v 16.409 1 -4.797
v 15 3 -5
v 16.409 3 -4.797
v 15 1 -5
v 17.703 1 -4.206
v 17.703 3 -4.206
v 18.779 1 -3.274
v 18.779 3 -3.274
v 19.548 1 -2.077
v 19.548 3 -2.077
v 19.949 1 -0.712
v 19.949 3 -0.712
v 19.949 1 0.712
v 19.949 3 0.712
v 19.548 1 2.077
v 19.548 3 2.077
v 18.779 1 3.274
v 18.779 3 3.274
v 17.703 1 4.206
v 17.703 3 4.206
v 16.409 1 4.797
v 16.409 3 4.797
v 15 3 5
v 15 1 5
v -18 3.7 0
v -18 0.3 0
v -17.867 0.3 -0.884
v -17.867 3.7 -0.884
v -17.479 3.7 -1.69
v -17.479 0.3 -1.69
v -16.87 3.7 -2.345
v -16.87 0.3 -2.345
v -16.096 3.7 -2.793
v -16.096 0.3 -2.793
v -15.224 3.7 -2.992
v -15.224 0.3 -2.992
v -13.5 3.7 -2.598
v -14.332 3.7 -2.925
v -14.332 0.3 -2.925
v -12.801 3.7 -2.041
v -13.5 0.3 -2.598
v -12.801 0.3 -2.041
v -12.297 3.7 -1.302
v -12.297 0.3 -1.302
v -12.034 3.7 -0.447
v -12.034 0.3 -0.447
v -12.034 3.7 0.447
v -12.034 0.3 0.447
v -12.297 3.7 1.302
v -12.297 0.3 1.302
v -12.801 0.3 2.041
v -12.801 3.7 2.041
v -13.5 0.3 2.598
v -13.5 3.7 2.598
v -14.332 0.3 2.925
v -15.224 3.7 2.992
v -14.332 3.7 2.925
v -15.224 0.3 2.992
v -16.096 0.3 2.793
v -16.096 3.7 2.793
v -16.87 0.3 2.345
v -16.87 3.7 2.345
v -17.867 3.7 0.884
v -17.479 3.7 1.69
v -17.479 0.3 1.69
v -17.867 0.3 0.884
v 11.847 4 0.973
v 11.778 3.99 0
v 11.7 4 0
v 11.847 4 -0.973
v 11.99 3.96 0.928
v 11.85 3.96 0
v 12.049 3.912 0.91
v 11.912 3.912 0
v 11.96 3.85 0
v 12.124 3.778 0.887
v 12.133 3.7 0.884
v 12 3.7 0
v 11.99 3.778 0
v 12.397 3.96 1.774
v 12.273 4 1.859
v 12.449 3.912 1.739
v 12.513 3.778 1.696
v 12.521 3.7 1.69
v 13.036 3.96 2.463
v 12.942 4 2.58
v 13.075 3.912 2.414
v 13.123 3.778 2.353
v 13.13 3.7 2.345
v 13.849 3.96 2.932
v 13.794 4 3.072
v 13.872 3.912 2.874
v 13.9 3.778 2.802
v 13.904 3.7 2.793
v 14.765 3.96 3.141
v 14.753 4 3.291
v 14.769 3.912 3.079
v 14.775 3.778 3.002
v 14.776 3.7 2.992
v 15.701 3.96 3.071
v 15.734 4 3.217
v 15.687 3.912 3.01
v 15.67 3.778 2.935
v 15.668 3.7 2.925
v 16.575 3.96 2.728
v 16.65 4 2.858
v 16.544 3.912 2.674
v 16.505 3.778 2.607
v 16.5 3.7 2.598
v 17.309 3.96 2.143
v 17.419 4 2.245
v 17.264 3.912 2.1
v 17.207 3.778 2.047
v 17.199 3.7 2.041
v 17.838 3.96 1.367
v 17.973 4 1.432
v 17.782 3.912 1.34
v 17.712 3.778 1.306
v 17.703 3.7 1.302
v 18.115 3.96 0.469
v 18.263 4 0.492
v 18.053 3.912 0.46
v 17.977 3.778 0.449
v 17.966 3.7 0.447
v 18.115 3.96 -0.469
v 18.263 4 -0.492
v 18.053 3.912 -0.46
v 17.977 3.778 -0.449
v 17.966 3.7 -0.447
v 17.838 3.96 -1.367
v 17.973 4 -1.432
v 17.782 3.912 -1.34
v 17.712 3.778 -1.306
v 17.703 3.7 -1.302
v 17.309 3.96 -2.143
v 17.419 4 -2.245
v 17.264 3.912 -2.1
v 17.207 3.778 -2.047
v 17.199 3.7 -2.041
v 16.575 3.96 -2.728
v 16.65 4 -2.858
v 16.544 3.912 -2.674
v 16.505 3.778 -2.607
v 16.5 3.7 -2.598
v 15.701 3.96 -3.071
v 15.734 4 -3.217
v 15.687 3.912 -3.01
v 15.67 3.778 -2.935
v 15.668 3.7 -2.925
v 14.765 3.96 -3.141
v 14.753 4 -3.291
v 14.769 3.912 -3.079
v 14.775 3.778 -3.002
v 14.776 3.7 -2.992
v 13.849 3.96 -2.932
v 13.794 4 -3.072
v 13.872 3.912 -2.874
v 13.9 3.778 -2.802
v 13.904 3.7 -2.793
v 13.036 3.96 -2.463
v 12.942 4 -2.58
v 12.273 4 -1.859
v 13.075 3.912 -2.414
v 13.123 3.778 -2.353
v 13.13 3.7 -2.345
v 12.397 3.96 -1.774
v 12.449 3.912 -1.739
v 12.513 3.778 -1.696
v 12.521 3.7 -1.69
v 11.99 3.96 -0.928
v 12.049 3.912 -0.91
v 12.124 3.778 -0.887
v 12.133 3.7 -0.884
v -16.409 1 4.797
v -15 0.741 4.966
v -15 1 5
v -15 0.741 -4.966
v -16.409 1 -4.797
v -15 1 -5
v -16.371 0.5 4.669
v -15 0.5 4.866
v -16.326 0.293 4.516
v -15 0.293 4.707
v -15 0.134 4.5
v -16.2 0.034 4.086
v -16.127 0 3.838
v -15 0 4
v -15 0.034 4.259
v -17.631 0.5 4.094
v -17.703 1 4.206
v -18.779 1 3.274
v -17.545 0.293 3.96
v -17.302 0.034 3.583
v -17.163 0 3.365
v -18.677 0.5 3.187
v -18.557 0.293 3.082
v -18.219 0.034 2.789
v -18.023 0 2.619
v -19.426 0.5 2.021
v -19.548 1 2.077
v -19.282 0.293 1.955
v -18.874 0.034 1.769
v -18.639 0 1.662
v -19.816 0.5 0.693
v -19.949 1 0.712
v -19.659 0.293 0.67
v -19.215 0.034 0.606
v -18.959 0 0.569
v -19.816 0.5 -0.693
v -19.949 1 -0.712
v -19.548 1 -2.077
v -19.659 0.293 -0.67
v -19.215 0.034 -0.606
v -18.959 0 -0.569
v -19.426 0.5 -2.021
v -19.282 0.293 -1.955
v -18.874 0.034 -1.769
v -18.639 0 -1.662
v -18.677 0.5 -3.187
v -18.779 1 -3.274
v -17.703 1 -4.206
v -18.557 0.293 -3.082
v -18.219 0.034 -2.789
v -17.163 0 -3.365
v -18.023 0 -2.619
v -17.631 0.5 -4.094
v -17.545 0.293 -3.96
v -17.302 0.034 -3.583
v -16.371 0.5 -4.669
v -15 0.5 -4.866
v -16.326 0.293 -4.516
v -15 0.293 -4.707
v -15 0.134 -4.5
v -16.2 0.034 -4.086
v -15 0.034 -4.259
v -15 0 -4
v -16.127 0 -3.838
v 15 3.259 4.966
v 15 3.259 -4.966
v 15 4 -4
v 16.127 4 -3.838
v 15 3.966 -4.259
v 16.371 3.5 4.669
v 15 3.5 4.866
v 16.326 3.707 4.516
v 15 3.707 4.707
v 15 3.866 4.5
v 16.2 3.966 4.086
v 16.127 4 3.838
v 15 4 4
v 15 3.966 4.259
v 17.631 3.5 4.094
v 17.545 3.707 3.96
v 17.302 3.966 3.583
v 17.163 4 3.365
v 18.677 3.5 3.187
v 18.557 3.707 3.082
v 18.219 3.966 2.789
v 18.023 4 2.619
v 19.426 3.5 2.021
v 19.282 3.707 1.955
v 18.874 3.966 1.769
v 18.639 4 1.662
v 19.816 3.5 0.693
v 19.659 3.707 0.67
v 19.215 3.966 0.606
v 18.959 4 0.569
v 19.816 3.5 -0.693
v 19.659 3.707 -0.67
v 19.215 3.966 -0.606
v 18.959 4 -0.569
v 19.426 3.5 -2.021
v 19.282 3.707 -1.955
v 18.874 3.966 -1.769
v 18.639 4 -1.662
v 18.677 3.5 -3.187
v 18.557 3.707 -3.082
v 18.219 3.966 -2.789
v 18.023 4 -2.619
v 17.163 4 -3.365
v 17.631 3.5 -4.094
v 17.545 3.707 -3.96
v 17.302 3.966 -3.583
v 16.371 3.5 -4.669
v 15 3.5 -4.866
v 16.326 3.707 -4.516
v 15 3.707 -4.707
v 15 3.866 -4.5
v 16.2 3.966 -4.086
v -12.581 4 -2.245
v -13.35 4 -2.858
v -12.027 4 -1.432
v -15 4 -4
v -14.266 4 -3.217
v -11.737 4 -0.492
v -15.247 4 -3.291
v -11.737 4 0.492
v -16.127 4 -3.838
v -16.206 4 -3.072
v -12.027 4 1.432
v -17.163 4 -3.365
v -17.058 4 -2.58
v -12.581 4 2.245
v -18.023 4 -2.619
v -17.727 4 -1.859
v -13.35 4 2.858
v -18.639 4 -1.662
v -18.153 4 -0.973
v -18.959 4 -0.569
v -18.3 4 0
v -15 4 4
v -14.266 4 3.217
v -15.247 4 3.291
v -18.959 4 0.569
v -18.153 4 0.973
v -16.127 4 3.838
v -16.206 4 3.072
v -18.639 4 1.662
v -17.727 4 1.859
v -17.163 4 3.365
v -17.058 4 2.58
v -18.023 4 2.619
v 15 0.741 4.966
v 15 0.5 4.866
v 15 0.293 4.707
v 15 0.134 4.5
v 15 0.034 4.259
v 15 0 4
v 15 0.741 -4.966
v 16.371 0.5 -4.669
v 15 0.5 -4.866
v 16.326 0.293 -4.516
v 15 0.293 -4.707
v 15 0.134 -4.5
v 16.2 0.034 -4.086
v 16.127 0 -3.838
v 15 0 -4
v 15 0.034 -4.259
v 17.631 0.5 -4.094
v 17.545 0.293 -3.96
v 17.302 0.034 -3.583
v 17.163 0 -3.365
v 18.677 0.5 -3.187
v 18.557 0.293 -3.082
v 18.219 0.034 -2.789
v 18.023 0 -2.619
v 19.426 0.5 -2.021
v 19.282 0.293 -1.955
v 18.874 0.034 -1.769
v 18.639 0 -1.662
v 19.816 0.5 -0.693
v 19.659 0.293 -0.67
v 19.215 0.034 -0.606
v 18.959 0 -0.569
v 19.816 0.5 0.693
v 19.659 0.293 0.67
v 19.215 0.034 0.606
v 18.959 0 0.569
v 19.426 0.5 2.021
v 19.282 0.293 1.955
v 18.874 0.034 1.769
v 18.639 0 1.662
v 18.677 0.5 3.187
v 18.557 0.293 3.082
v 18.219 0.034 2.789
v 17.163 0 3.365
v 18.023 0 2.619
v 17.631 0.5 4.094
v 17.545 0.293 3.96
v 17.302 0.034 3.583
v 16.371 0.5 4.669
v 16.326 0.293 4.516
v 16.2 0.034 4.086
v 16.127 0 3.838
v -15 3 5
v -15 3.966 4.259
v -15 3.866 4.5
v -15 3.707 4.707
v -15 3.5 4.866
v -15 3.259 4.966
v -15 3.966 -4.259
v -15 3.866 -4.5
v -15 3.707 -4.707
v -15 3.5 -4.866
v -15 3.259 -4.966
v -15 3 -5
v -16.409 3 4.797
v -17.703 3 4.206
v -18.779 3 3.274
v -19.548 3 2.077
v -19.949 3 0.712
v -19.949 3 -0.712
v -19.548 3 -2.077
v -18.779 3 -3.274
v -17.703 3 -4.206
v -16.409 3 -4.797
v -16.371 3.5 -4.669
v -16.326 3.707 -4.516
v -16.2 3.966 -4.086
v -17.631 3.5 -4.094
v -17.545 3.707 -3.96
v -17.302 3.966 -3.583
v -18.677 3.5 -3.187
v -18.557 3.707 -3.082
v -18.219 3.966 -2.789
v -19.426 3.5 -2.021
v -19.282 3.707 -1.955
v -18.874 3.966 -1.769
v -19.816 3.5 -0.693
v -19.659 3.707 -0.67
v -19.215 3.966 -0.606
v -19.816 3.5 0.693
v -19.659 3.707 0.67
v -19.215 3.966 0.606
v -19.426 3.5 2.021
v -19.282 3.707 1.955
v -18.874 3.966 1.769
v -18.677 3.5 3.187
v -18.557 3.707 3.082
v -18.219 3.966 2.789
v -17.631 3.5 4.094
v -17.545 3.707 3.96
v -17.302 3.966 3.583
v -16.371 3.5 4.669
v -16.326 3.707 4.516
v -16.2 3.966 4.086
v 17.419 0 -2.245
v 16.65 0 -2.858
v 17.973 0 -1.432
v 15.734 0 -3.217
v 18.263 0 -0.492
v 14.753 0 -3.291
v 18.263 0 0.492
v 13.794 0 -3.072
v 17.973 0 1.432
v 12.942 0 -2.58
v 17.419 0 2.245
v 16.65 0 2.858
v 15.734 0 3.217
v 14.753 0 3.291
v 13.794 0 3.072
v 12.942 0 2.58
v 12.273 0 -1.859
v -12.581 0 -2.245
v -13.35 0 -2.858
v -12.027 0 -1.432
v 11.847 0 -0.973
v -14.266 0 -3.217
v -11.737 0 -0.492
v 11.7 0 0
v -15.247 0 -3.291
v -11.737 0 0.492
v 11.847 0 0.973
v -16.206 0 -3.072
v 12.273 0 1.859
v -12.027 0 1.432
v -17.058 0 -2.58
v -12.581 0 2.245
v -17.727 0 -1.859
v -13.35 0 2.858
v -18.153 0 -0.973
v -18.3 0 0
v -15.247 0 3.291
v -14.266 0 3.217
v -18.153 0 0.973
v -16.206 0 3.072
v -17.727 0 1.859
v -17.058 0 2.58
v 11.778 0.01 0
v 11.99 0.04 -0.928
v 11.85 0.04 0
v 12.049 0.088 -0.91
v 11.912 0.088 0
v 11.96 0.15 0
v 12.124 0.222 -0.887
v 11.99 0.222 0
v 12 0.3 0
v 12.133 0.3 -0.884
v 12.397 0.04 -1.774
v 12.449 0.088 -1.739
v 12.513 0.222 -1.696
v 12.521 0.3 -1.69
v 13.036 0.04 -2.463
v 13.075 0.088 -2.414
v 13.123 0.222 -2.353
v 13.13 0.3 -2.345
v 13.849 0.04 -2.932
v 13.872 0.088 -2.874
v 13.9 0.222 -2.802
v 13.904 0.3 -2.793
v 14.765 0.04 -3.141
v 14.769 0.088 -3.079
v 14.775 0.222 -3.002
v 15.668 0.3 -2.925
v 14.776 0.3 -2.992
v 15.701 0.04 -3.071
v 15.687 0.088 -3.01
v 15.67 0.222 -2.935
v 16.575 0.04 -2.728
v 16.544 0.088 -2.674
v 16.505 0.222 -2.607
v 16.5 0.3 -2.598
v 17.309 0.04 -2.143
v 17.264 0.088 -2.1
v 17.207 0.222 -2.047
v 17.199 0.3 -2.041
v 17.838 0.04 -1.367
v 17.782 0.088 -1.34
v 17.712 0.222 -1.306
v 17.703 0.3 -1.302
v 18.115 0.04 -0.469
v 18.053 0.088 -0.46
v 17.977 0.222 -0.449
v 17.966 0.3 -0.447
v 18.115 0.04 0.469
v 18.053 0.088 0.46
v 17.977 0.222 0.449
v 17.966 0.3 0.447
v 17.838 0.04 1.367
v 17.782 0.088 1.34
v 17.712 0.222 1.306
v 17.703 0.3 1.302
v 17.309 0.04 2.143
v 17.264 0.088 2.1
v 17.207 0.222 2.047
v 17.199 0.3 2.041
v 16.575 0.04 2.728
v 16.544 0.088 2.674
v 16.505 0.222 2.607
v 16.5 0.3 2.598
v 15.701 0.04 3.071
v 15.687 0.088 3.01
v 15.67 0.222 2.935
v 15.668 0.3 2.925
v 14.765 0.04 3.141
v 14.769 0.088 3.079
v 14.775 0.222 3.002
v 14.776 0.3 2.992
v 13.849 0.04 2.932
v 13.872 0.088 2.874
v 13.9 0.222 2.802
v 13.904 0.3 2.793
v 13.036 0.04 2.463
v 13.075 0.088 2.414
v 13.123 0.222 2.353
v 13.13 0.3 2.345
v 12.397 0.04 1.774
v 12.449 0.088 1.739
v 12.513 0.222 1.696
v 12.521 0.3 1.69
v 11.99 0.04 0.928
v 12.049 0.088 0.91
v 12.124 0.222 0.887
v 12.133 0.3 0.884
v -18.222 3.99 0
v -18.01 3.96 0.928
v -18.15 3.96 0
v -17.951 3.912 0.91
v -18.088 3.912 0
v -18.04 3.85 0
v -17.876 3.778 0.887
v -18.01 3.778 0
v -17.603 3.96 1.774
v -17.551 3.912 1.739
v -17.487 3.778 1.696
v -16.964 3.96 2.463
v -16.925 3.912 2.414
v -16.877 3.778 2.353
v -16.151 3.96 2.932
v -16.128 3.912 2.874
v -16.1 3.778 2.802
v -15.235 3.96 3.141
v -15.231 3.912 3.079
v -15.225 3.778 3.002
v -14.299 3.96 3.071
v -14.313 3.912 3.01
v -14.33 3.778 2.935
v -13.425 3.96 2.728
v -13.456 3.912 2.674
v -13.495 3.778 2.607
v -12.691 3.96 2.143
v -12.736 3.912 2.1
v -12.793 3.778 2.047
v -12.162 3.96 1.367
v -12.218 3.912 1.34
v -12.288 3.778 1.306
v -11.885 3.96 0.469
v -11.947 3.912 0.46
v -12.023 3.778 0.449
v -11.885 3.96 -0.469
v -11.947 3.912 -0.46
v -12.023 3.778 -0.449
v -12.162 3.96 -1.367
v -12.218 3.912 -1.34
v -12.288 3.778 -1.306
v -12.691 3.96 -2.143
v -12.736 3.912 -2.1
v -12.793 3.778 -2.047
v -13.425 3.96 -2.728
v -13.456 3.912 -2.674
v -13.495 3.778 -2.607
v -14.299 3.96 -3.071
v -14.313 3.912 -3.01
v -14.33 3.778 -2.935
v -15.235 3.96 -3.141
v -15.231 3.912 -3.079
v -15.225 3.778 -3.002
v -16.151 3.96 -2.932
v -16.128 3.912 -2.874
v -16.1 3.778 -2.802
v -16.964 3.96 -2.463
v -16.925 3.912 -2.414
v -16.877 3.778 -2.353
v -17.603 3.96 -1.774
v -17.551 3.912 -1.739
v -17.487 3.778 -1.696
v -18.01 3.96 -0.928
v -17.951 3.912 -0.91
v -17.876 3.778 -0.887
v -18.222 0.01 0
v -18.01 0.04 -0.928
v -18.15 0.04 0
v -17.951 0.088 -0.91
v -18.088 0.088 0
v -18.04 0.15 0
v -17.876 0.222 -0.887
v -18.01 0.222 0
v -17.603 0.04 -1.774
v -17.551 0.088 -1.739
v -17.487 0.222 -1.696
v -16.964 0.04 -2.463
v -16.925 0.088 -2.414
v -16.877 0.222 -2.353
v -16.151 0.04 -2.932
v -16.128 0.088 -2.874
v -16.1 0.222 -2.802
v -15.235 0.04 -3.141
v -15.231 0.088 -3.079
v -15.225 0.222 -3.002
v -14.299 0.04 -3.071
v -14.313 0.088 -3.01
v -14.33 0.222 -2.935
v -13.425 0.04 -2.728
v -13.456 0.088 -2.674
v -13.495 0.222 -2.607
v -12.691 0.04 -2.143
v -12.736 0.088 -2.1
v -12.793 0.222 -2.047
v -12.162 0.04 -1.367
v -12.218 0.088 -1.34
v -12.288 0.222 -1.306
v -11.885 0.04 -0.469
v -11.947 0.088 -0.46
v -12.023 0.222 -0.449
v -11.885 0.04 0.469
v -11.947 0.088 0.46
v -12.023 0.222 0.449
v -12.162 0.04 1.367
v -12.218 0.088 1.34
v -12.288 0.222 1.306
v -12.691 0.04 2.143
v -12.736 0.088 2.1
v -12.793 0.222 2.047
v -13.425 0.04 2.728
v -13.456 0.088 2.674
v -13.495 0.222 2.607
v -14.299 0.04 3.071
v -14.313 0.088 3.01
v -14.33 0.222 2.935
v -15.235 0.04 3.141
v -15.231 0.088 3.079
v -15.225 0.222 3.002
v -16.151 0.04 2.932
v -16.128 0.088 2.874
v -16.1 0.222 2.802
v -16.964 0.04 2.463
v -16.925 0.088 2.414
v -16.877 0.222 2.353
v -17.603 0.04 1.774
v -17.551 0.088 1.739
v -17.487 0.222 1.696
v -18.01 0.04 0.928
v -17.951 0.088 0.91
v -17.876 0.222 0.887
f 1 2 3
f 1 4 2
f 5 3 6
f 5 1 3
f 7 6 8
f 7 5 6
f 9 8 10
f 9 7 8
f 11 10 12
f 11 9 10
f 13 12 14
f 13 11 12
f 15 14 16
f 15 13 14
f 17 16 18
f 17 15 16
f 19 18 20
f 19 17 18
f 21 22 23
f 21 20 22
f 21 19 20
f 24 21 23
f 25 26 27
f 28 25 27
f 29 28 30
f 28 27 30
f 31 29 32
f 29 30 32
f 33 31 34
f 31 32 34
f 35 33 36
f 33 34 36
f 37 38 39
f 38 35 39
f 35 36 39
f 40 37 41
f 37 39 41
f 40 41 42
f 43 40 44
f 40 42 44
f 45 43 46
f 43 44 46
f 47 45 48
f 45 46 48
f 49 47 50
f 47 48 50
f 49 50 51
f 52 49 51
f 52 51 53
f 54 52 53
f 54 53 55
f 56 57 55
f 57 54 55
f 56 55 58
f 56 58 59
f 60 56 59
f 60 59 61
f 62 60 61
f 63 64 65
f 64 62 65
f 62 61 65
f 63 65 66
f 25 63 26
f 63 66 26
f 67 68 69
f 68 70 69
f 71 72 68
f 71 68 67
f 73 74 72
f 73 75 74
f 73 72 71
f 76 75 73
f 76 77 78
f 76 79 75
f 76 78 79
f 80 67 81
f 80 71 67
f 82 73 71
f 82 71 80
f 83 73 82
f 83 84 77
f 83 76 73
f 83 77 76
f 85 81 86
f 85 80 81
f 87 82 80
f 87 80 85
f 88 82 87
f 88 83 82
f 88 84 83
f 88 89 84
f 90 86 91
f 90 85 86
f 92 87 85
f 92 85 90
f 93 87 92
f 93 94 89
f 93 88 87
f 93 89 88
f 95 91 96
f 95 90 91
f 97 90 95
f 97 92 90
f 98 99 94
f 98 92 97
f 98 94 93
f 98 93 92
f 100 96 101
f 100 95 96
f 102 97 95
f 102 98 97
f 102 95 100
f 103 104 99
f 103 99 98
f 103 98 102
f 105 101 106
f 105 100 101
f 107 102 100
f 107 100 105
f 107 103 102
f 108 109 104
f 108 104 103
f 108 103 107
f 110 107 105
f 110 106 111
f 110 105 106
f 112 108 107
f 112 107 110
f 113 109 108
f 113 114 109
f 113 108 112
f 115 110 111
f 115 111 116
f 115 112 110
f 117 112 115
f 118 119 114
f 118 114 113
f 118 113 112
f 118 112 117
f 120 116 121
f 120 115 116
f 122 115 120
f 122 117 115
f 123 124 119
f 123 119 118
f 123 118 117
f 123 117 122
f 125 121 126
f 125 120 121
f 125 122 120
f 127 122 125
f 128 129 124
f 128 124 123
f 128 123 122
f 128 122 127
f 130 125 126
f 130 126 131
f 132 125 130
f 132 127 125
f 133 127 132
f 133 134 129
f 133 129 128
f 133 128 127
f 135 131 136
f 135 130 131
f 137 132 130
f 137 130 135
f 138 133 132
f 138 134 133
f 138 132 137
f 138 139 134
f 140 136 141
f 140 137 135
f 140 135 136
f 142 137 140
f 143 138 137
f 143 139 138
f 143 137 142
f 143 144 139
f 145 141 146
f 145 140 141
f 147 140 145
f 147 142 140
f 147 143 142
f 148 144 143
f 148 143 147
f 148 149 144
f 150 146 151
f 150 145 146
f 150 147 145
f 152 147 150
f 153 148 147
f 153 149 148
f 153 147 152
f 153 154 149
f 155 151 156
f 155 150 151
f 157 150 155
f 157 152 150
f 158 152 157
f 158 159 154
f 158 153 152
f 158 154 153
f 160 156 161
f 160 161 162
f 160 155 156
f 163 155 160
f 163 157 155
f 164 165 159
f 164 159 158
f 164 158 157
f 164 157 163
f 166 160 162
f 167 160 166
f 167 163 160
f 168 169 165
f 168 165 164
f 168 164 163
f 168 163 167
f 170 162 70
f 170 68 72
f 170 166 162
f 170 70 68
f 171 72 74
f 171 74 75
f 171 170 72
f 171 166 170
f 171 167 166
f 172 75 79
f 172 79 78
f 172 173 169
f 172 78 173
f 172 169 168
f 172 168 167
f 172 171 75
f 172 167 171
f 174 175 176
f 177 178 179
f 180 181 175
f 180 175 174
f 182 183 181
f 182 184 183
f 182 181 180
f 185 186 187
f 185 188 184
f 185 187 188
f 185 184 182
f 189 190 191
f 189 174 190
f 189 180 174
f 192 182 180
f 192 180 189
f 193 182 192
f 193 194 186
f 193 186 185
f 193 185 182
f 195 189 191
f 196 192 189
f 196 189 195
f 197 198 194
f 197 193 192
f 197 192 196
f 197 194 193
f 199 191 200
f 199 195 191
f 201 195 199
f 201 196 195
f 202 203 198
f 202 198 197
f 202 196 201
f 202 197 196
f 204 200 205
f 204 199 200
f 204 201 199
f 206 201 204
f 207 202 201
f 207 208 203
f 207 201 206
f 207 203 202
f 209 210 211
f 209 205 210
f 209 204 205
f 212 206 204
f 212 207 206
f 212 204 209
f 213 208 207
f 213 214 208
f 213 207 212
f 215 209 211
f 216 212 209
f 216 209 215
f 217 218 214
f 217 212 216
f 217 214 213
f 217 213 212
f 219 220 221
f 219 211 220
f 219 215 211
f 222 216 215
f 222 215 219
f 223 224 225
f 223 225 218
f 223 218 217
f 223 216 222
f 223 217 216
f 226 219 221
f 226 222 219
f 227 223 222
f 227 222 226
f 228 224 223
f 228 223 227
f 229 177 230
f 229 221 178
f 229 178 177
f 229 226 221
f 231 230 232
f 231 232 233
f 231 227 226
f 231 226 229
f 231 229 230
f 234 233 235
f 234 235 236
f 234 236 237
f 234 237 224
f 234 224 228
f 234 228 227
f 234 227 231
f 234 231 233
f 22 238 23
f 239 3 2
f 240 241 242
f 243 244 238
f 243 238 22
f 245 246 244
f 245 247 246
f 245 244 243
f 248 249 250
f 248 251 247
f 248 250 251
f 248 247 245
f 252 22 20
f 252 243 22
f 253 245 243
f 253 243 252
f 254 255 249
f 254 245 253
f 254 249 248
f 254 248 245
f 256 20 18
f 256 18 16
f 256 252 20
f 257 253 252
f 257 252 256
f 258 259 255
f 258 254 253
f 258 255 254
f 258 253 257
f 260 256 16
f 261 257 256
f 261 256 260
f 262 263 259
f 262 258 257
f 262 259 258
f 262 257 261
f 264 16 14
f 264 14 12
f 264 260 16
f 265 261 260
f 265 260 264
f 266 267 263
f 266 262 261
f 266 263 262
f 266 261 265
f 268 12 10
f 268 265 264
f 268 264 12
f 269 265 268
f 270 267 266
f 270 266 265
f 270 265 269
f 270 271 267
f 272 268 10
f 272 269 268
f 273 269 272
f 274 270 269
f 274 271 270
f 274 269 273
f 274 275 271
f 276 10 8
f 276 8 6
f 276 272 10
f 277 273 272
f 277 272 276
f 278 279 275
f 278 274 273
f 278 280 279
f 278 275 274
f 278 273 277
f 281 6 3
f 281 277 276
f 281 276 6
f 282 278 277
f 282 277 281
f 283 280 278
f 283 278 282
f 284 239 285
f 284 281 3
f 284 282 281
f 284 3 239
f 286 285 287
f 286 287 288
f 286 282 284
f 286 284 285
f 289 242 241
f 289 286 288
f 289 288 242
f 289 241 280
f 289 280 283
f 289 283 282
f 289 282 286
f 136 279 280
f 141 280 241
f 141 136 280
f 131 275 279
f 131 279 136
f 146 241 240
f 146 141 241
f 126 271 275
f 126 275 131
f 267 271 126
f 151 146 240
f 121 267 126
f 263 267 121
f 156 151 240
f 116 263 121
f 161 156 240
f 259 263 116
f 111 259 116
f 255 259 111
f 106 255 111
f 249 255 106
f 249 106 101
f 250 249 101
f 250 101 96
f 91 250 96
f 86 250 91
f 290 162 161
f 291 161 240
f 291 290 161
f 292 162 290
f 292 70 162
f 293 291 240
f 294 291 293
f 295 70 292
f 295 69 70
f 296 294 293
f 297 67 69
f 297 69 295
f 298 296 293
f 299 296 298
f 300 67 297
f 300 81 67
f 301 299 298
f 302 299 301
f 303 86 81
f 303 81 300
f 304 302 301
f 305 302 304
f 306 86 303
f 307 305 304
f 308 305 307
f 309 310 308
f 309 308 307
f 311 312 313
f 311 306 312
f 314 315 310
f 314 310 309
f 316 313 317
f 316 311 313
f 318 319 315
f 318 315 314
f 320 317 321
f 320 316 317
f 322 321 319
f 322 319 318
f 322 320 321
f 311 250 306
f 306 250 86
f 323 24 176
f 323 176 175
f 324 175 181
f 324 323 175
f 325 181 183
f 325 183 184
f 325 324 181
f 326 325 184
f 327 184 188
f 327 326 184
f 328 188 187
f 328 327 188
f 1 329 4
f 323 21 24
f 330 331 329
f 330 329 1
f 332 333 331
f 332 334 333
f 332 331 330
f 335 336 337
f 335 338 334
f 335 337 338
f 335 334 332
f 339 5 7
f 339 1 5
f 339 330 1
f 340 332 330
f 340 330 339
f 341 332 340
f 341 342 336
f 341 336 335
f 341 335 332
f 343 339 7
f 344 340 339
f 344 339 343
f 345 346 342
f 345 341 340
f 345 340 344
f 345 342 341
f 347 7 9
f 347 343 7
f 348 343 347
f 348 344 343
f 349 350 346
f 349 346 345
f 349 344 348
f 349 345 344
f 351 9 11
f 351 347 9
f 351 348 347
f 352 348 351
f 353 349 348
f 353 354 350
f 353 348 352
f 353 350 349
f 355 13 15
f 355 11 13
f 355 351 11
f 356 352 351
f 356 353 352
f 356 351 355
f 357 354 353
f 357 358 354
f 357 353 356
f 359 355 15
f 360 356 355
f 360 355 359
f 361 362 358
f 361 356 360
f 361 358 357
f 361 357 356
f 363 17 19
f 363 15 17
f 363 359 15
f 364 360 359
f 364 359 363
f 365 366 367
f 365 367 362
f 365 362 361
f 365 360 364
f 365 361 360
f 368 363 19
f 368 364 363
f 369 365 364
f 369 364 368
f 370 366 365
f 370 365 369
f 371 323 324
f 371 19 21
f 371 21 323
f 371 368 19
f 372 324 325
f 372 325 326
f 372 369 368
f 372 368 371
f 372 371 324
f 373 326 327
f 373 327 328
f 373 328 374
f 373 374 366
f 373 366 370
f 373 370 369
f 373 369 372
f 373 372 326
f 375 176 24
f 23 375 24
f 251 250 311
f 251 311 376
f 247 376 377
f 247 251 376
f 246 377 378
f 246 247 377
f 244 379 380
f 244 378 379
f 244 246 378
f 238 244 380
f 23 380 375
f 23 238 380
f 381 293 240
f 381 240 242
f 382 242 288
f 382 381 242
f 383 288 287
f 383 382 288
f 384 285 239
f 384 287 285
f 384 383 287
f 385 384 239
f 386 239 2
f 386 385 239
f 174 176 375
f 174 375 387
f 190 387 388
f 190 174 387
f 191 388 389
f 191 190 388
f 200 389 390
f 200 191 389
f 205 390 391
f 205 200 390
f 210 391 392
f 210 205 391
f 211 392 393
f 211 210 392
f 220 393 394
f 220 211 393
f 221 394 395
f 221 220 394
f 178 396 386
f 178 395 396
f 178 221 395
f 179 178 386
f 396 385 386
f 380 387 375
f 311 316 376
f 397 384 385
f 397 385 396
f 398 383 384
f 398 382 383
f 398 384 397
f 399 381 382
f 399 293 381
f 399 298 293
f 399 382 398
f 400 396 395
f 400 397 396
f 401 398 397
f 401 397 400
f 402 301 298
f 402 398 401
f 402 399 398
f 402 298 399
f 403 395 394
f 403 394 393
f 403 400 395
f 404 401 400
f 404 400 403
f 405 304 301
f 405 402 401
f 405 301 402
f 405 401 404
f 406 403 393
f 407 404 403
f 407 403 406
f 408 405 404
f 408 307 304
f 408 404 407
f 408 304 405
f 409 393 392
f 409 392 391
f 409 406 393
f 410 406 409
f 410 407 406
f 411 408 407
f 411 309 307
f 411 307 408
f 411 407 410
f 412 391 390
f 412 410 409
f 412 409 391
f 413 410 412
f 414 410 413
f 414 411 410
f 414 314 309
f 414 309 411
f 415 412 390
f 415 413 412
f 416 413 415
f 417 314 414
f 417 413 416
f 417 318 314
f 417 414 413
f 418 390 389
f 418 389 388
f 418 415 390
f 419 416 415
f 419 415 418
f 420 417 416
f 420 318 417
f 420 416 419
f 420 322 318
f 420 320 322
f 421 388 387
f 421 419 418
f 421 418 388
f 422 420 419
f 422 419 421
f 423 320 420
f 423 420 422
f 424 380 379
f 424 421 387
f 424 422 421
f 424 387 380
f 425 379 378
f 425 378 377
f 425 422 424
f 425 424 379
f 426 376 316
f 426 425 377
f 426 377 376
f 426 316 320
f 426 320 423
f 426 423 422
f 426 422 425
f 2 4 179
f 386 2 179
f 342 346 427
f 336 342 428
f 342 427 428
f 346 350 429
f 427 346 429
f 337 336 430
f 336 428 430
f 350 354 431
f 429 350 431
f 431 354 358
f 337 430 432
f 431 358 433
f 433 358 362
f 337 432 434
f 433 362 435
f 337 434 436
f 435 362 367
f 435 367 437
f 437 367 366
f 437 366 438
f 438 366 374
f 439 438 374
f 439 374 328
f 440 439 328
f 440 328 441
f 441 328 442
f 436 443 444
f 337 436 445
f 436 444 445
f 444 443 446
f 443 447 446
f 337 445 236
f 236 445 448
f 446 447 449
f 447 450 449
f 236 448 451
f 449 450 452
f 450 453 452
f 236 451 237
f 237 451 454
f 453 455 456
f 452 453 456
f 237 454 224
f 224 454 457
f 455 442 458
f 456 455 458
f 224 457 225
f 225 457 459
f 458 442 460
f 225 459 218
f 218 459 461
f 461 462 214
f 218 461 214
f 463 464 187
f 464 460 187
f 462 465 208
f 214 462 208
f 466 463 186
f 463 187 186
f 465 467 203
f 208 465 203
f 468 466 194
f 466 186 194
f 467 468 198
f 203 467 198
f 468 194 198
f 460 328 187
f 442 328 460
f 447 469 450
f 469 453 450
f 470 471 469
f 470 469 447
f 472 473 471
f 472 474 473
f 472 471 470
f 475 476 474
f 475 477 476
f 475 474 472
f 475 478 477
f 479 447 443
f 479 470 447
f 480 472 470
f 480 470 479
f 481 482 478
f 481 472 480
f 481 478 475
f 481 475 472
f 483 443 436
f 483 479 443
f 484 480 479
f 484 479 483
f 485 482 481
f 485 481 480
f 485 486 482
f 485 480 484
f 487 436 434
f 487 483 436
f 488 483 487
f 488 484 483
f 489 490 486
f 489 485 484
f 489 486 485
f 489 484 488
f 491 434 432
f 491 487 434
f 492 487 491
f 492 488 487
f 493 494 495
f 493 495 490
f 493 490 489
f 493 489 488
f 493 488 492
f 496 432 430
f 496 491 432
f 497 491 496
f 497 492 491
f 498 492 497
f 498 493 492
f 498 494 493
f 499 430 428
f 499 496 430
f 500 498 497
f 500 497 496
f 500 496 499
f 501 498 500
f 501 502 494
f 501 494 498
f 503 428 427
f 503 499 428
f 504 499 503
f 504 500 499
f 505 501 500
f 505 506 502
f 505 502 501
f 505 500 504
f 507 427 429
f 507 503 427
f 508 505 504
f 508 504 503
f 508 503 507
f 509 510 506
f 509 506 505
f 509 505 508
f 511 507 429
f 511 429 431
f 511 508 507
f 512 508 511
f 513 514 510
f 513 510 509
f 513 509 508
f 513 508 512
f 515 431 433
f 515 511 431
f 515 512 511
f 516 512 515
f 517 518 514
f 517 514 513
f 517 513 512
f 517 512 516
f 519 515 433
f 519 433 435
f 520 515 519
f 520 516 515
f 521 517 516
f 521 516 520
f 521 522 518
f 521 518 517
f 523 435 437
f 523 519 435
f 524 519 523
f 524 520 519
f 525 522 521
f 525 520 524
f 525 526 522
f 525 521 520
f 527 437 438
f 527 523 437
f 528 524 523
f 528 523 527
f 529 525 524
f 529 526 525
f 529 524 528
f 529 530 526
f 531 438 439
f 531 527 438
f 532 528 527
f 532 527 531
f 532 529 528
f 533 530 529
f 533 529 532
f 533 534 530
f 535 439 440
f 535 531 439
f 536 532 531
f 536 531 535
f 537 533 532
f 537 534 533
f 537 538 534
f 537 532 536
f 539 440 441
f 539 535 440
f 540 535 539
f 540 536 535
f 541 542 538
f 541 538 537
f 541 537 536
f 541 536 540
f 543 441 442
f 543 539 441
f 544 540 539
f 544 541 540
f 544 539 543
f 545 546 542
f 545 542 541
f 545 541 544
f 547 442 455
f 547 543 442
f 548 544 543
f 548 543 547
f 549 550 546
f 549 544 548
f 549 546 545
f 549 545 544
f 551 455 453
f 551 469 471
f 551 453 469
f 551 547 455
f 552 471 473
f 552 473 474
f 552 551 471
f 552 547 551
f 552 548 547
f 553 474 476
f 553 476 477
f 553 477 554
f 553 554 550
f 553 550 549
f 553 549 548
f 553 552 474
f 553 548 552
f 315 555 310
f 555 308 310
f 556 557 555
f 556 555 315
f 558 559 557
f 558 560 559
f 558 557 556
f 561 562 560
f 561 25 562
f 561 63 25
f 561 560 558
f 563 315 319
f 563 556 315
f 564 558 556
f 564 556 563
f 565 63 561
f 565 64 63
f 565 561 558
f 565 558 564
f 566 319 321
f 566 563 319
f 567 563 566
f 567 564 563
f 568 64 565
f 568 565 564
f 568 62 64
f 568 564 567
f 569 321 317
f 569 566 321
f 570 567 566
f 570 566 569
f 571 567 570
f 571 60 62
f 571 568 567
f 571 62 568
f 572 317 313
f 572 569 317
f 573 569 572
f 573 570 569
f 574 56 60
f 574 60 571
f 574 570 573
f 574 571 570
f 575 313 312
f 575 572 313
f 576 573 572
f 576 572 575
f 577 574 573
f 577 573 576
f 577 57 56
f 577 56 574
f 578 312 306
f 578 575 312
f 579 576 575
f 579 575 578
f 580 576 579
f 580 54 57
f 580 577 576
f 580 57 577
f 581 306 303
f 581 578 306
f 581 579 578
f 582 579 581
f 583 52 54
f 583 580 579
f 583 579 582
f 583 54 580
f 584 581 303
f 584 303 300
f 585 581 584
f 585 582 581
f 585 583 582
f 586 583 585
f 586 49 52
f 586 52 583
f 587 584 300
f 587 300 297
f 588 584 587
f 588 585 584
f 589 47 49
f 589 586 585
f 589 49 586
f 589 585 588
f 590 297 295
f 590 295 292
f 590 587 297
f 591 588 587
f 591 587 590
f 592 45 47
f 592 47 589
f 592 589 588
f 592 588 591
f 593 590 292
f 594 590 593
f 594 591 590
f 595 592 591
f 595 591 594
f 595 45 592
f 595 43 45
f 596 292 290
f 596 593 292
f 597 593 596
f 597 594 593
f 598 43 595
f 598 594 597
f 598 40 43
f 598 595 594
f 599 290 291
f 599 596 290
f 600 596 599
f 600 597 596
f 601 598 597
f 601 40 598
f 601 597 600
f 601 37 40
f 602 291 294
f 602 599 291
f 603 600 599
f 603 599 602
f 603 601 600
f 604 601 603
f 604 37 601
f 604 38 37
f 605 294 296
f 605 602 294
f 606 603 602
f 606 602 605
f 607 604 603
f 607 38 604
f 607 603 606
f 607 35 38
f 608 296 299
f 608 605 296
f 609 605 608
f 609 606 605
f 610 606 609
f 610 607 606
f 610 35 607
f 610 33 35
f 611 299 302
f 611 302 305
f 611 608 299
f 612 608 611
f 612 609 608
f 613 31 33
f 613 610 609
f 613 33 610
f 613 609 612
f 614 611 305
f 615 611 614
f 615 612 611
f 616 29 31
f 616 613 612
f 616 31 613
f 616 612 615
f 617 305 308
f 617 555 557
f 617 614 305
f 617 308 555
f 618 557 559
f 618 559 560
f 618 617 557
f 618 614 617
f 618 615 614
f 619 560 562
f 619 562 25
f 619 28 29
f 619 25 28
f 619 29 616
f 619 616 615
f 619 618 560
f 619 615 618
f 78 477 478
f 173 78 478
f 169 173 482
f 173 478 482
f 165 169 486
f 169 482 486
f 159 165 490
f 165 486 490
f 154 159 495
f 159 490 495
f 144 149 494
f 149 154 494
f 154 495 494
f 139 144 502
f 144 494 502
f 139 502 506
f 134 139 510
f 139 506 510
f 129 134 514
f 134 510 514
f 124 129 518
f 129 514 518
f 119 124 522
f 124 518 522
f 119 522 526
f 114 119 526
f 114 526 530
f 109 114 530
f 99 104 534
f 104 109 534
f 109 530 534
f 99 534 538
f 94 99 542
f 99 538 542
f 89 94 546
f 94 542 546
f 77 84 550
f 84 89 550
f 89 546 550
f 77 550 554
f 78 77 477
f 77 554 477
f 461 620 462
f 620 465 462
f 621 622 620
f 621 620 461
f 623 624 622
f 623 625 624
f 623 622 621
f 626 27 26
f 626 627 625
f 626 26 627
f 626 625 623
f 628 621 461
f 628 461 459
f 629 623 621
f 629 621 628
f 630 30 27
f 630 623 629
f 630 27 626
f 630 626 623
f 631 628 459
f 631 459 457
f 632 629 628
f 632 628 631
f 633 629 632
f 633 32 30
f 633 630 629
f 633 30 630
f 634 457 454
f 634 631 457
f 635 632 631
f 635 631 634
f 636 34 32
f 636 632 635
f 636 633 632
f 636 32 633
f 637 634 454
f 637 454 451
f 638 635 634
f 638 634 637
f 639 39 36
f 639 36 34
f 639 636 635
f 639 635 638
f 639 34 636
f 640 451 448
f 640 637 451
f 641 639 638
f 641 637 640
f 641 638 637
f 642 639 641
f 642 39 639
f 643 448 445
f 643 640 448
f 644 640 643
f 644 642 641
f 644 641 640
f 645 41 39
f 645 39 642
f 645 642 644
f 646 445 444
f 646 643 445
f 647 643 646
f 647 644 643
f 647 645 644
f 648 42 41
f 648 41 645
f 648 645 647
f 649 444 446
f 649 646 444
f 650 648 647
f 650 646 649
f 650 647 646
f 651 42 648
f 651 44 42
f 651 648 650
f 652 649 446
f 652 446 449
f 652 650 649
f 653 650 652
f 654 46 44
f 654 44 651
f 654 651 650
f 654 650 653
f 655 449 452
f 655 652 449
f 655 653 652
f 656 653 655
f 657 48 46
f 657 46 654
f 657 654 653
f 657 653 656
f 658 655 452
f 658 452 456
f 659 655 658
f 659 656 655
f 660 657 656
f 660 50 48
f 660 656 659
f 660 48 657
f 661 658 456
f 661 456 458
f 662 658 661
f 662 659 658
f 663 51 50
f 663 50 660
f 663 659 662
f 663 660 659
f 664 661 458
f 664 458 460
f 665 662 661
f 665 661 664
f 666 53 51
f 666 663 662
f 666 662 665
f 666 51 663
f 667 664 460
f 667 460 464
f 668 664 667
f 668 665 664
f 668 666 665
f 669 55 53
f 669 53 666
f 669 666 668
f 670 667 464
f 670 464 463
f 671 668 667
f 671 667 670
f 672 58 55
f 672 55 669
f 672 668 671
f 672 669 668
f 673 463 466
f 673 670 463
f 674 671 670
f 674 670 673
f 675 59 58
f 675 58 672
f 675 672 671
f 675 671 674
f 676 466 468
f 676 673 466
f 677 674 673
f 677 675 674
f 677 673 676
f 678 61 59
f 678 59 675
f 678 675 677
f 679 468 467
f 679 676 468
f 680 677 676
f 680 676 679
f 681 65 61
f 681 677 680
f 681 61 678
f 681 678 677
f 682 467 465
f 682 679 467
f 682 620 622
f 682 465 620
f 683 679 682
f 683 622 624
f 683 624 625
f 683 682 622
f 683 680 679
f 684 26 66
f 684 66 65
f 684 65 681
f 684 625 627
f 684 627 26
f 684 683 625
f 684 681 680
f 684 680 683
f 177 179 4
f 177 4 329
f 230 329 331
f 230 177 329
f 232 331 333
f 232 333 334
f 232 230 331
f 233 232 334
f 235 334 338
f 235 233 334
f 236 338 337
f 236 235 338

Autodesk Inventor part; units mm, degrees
ref_plane "YZ Plane" through (0, 0, 0) normal (1, 0, 0) x (0, 1, 0)
ref_plane "XY Plane" through (0, 0, 0) normal (0, 0, 1) x (1, 0, 0)
sketch "Эскиз1" plane through (0, 0, 0) normal (0, 1, 0) x (-1, 0, 0)
  line L0 (15, 0) -> (-15, 0) construction
  line L1 (15, 5) -> (-15, 5)
  line L2 (-15, -5) -> (15, -5)
  arc A0 (15, -5) -> (15, 5) centre (15, 0) ccw
  arc A1 (-15, 5) -> (-15, -5) centre (-15, 0) ccw
  circle A2 centre (15, 0) radius 3
  circle A3 centre (-15, 0) radius 3
  point P0 (0, 0)
  point P1 (0, 0)
  dimension "d0" = 30
  dimension "d1" = 10
  dimension "d2" = 6
extrude "Выдавливание1" add sketch "Эскиз1" along normal blind 4
fillet "Сопряжение1" radius 1 8 edges at (20, 4, 0) (0, 4, -5) (-20, 4, 0) (0, 4, 5) (20, 0, 0) (0, 0, -5) (-20, 0, 0) (0, 0, 5)
fillet "Сопряжение2" radius 0.3 4 edges at (-12, 0, 0) (-12, 4, 0) (18, 0, 0) (18, 4, 0)
properties part number "рычаг-1"
